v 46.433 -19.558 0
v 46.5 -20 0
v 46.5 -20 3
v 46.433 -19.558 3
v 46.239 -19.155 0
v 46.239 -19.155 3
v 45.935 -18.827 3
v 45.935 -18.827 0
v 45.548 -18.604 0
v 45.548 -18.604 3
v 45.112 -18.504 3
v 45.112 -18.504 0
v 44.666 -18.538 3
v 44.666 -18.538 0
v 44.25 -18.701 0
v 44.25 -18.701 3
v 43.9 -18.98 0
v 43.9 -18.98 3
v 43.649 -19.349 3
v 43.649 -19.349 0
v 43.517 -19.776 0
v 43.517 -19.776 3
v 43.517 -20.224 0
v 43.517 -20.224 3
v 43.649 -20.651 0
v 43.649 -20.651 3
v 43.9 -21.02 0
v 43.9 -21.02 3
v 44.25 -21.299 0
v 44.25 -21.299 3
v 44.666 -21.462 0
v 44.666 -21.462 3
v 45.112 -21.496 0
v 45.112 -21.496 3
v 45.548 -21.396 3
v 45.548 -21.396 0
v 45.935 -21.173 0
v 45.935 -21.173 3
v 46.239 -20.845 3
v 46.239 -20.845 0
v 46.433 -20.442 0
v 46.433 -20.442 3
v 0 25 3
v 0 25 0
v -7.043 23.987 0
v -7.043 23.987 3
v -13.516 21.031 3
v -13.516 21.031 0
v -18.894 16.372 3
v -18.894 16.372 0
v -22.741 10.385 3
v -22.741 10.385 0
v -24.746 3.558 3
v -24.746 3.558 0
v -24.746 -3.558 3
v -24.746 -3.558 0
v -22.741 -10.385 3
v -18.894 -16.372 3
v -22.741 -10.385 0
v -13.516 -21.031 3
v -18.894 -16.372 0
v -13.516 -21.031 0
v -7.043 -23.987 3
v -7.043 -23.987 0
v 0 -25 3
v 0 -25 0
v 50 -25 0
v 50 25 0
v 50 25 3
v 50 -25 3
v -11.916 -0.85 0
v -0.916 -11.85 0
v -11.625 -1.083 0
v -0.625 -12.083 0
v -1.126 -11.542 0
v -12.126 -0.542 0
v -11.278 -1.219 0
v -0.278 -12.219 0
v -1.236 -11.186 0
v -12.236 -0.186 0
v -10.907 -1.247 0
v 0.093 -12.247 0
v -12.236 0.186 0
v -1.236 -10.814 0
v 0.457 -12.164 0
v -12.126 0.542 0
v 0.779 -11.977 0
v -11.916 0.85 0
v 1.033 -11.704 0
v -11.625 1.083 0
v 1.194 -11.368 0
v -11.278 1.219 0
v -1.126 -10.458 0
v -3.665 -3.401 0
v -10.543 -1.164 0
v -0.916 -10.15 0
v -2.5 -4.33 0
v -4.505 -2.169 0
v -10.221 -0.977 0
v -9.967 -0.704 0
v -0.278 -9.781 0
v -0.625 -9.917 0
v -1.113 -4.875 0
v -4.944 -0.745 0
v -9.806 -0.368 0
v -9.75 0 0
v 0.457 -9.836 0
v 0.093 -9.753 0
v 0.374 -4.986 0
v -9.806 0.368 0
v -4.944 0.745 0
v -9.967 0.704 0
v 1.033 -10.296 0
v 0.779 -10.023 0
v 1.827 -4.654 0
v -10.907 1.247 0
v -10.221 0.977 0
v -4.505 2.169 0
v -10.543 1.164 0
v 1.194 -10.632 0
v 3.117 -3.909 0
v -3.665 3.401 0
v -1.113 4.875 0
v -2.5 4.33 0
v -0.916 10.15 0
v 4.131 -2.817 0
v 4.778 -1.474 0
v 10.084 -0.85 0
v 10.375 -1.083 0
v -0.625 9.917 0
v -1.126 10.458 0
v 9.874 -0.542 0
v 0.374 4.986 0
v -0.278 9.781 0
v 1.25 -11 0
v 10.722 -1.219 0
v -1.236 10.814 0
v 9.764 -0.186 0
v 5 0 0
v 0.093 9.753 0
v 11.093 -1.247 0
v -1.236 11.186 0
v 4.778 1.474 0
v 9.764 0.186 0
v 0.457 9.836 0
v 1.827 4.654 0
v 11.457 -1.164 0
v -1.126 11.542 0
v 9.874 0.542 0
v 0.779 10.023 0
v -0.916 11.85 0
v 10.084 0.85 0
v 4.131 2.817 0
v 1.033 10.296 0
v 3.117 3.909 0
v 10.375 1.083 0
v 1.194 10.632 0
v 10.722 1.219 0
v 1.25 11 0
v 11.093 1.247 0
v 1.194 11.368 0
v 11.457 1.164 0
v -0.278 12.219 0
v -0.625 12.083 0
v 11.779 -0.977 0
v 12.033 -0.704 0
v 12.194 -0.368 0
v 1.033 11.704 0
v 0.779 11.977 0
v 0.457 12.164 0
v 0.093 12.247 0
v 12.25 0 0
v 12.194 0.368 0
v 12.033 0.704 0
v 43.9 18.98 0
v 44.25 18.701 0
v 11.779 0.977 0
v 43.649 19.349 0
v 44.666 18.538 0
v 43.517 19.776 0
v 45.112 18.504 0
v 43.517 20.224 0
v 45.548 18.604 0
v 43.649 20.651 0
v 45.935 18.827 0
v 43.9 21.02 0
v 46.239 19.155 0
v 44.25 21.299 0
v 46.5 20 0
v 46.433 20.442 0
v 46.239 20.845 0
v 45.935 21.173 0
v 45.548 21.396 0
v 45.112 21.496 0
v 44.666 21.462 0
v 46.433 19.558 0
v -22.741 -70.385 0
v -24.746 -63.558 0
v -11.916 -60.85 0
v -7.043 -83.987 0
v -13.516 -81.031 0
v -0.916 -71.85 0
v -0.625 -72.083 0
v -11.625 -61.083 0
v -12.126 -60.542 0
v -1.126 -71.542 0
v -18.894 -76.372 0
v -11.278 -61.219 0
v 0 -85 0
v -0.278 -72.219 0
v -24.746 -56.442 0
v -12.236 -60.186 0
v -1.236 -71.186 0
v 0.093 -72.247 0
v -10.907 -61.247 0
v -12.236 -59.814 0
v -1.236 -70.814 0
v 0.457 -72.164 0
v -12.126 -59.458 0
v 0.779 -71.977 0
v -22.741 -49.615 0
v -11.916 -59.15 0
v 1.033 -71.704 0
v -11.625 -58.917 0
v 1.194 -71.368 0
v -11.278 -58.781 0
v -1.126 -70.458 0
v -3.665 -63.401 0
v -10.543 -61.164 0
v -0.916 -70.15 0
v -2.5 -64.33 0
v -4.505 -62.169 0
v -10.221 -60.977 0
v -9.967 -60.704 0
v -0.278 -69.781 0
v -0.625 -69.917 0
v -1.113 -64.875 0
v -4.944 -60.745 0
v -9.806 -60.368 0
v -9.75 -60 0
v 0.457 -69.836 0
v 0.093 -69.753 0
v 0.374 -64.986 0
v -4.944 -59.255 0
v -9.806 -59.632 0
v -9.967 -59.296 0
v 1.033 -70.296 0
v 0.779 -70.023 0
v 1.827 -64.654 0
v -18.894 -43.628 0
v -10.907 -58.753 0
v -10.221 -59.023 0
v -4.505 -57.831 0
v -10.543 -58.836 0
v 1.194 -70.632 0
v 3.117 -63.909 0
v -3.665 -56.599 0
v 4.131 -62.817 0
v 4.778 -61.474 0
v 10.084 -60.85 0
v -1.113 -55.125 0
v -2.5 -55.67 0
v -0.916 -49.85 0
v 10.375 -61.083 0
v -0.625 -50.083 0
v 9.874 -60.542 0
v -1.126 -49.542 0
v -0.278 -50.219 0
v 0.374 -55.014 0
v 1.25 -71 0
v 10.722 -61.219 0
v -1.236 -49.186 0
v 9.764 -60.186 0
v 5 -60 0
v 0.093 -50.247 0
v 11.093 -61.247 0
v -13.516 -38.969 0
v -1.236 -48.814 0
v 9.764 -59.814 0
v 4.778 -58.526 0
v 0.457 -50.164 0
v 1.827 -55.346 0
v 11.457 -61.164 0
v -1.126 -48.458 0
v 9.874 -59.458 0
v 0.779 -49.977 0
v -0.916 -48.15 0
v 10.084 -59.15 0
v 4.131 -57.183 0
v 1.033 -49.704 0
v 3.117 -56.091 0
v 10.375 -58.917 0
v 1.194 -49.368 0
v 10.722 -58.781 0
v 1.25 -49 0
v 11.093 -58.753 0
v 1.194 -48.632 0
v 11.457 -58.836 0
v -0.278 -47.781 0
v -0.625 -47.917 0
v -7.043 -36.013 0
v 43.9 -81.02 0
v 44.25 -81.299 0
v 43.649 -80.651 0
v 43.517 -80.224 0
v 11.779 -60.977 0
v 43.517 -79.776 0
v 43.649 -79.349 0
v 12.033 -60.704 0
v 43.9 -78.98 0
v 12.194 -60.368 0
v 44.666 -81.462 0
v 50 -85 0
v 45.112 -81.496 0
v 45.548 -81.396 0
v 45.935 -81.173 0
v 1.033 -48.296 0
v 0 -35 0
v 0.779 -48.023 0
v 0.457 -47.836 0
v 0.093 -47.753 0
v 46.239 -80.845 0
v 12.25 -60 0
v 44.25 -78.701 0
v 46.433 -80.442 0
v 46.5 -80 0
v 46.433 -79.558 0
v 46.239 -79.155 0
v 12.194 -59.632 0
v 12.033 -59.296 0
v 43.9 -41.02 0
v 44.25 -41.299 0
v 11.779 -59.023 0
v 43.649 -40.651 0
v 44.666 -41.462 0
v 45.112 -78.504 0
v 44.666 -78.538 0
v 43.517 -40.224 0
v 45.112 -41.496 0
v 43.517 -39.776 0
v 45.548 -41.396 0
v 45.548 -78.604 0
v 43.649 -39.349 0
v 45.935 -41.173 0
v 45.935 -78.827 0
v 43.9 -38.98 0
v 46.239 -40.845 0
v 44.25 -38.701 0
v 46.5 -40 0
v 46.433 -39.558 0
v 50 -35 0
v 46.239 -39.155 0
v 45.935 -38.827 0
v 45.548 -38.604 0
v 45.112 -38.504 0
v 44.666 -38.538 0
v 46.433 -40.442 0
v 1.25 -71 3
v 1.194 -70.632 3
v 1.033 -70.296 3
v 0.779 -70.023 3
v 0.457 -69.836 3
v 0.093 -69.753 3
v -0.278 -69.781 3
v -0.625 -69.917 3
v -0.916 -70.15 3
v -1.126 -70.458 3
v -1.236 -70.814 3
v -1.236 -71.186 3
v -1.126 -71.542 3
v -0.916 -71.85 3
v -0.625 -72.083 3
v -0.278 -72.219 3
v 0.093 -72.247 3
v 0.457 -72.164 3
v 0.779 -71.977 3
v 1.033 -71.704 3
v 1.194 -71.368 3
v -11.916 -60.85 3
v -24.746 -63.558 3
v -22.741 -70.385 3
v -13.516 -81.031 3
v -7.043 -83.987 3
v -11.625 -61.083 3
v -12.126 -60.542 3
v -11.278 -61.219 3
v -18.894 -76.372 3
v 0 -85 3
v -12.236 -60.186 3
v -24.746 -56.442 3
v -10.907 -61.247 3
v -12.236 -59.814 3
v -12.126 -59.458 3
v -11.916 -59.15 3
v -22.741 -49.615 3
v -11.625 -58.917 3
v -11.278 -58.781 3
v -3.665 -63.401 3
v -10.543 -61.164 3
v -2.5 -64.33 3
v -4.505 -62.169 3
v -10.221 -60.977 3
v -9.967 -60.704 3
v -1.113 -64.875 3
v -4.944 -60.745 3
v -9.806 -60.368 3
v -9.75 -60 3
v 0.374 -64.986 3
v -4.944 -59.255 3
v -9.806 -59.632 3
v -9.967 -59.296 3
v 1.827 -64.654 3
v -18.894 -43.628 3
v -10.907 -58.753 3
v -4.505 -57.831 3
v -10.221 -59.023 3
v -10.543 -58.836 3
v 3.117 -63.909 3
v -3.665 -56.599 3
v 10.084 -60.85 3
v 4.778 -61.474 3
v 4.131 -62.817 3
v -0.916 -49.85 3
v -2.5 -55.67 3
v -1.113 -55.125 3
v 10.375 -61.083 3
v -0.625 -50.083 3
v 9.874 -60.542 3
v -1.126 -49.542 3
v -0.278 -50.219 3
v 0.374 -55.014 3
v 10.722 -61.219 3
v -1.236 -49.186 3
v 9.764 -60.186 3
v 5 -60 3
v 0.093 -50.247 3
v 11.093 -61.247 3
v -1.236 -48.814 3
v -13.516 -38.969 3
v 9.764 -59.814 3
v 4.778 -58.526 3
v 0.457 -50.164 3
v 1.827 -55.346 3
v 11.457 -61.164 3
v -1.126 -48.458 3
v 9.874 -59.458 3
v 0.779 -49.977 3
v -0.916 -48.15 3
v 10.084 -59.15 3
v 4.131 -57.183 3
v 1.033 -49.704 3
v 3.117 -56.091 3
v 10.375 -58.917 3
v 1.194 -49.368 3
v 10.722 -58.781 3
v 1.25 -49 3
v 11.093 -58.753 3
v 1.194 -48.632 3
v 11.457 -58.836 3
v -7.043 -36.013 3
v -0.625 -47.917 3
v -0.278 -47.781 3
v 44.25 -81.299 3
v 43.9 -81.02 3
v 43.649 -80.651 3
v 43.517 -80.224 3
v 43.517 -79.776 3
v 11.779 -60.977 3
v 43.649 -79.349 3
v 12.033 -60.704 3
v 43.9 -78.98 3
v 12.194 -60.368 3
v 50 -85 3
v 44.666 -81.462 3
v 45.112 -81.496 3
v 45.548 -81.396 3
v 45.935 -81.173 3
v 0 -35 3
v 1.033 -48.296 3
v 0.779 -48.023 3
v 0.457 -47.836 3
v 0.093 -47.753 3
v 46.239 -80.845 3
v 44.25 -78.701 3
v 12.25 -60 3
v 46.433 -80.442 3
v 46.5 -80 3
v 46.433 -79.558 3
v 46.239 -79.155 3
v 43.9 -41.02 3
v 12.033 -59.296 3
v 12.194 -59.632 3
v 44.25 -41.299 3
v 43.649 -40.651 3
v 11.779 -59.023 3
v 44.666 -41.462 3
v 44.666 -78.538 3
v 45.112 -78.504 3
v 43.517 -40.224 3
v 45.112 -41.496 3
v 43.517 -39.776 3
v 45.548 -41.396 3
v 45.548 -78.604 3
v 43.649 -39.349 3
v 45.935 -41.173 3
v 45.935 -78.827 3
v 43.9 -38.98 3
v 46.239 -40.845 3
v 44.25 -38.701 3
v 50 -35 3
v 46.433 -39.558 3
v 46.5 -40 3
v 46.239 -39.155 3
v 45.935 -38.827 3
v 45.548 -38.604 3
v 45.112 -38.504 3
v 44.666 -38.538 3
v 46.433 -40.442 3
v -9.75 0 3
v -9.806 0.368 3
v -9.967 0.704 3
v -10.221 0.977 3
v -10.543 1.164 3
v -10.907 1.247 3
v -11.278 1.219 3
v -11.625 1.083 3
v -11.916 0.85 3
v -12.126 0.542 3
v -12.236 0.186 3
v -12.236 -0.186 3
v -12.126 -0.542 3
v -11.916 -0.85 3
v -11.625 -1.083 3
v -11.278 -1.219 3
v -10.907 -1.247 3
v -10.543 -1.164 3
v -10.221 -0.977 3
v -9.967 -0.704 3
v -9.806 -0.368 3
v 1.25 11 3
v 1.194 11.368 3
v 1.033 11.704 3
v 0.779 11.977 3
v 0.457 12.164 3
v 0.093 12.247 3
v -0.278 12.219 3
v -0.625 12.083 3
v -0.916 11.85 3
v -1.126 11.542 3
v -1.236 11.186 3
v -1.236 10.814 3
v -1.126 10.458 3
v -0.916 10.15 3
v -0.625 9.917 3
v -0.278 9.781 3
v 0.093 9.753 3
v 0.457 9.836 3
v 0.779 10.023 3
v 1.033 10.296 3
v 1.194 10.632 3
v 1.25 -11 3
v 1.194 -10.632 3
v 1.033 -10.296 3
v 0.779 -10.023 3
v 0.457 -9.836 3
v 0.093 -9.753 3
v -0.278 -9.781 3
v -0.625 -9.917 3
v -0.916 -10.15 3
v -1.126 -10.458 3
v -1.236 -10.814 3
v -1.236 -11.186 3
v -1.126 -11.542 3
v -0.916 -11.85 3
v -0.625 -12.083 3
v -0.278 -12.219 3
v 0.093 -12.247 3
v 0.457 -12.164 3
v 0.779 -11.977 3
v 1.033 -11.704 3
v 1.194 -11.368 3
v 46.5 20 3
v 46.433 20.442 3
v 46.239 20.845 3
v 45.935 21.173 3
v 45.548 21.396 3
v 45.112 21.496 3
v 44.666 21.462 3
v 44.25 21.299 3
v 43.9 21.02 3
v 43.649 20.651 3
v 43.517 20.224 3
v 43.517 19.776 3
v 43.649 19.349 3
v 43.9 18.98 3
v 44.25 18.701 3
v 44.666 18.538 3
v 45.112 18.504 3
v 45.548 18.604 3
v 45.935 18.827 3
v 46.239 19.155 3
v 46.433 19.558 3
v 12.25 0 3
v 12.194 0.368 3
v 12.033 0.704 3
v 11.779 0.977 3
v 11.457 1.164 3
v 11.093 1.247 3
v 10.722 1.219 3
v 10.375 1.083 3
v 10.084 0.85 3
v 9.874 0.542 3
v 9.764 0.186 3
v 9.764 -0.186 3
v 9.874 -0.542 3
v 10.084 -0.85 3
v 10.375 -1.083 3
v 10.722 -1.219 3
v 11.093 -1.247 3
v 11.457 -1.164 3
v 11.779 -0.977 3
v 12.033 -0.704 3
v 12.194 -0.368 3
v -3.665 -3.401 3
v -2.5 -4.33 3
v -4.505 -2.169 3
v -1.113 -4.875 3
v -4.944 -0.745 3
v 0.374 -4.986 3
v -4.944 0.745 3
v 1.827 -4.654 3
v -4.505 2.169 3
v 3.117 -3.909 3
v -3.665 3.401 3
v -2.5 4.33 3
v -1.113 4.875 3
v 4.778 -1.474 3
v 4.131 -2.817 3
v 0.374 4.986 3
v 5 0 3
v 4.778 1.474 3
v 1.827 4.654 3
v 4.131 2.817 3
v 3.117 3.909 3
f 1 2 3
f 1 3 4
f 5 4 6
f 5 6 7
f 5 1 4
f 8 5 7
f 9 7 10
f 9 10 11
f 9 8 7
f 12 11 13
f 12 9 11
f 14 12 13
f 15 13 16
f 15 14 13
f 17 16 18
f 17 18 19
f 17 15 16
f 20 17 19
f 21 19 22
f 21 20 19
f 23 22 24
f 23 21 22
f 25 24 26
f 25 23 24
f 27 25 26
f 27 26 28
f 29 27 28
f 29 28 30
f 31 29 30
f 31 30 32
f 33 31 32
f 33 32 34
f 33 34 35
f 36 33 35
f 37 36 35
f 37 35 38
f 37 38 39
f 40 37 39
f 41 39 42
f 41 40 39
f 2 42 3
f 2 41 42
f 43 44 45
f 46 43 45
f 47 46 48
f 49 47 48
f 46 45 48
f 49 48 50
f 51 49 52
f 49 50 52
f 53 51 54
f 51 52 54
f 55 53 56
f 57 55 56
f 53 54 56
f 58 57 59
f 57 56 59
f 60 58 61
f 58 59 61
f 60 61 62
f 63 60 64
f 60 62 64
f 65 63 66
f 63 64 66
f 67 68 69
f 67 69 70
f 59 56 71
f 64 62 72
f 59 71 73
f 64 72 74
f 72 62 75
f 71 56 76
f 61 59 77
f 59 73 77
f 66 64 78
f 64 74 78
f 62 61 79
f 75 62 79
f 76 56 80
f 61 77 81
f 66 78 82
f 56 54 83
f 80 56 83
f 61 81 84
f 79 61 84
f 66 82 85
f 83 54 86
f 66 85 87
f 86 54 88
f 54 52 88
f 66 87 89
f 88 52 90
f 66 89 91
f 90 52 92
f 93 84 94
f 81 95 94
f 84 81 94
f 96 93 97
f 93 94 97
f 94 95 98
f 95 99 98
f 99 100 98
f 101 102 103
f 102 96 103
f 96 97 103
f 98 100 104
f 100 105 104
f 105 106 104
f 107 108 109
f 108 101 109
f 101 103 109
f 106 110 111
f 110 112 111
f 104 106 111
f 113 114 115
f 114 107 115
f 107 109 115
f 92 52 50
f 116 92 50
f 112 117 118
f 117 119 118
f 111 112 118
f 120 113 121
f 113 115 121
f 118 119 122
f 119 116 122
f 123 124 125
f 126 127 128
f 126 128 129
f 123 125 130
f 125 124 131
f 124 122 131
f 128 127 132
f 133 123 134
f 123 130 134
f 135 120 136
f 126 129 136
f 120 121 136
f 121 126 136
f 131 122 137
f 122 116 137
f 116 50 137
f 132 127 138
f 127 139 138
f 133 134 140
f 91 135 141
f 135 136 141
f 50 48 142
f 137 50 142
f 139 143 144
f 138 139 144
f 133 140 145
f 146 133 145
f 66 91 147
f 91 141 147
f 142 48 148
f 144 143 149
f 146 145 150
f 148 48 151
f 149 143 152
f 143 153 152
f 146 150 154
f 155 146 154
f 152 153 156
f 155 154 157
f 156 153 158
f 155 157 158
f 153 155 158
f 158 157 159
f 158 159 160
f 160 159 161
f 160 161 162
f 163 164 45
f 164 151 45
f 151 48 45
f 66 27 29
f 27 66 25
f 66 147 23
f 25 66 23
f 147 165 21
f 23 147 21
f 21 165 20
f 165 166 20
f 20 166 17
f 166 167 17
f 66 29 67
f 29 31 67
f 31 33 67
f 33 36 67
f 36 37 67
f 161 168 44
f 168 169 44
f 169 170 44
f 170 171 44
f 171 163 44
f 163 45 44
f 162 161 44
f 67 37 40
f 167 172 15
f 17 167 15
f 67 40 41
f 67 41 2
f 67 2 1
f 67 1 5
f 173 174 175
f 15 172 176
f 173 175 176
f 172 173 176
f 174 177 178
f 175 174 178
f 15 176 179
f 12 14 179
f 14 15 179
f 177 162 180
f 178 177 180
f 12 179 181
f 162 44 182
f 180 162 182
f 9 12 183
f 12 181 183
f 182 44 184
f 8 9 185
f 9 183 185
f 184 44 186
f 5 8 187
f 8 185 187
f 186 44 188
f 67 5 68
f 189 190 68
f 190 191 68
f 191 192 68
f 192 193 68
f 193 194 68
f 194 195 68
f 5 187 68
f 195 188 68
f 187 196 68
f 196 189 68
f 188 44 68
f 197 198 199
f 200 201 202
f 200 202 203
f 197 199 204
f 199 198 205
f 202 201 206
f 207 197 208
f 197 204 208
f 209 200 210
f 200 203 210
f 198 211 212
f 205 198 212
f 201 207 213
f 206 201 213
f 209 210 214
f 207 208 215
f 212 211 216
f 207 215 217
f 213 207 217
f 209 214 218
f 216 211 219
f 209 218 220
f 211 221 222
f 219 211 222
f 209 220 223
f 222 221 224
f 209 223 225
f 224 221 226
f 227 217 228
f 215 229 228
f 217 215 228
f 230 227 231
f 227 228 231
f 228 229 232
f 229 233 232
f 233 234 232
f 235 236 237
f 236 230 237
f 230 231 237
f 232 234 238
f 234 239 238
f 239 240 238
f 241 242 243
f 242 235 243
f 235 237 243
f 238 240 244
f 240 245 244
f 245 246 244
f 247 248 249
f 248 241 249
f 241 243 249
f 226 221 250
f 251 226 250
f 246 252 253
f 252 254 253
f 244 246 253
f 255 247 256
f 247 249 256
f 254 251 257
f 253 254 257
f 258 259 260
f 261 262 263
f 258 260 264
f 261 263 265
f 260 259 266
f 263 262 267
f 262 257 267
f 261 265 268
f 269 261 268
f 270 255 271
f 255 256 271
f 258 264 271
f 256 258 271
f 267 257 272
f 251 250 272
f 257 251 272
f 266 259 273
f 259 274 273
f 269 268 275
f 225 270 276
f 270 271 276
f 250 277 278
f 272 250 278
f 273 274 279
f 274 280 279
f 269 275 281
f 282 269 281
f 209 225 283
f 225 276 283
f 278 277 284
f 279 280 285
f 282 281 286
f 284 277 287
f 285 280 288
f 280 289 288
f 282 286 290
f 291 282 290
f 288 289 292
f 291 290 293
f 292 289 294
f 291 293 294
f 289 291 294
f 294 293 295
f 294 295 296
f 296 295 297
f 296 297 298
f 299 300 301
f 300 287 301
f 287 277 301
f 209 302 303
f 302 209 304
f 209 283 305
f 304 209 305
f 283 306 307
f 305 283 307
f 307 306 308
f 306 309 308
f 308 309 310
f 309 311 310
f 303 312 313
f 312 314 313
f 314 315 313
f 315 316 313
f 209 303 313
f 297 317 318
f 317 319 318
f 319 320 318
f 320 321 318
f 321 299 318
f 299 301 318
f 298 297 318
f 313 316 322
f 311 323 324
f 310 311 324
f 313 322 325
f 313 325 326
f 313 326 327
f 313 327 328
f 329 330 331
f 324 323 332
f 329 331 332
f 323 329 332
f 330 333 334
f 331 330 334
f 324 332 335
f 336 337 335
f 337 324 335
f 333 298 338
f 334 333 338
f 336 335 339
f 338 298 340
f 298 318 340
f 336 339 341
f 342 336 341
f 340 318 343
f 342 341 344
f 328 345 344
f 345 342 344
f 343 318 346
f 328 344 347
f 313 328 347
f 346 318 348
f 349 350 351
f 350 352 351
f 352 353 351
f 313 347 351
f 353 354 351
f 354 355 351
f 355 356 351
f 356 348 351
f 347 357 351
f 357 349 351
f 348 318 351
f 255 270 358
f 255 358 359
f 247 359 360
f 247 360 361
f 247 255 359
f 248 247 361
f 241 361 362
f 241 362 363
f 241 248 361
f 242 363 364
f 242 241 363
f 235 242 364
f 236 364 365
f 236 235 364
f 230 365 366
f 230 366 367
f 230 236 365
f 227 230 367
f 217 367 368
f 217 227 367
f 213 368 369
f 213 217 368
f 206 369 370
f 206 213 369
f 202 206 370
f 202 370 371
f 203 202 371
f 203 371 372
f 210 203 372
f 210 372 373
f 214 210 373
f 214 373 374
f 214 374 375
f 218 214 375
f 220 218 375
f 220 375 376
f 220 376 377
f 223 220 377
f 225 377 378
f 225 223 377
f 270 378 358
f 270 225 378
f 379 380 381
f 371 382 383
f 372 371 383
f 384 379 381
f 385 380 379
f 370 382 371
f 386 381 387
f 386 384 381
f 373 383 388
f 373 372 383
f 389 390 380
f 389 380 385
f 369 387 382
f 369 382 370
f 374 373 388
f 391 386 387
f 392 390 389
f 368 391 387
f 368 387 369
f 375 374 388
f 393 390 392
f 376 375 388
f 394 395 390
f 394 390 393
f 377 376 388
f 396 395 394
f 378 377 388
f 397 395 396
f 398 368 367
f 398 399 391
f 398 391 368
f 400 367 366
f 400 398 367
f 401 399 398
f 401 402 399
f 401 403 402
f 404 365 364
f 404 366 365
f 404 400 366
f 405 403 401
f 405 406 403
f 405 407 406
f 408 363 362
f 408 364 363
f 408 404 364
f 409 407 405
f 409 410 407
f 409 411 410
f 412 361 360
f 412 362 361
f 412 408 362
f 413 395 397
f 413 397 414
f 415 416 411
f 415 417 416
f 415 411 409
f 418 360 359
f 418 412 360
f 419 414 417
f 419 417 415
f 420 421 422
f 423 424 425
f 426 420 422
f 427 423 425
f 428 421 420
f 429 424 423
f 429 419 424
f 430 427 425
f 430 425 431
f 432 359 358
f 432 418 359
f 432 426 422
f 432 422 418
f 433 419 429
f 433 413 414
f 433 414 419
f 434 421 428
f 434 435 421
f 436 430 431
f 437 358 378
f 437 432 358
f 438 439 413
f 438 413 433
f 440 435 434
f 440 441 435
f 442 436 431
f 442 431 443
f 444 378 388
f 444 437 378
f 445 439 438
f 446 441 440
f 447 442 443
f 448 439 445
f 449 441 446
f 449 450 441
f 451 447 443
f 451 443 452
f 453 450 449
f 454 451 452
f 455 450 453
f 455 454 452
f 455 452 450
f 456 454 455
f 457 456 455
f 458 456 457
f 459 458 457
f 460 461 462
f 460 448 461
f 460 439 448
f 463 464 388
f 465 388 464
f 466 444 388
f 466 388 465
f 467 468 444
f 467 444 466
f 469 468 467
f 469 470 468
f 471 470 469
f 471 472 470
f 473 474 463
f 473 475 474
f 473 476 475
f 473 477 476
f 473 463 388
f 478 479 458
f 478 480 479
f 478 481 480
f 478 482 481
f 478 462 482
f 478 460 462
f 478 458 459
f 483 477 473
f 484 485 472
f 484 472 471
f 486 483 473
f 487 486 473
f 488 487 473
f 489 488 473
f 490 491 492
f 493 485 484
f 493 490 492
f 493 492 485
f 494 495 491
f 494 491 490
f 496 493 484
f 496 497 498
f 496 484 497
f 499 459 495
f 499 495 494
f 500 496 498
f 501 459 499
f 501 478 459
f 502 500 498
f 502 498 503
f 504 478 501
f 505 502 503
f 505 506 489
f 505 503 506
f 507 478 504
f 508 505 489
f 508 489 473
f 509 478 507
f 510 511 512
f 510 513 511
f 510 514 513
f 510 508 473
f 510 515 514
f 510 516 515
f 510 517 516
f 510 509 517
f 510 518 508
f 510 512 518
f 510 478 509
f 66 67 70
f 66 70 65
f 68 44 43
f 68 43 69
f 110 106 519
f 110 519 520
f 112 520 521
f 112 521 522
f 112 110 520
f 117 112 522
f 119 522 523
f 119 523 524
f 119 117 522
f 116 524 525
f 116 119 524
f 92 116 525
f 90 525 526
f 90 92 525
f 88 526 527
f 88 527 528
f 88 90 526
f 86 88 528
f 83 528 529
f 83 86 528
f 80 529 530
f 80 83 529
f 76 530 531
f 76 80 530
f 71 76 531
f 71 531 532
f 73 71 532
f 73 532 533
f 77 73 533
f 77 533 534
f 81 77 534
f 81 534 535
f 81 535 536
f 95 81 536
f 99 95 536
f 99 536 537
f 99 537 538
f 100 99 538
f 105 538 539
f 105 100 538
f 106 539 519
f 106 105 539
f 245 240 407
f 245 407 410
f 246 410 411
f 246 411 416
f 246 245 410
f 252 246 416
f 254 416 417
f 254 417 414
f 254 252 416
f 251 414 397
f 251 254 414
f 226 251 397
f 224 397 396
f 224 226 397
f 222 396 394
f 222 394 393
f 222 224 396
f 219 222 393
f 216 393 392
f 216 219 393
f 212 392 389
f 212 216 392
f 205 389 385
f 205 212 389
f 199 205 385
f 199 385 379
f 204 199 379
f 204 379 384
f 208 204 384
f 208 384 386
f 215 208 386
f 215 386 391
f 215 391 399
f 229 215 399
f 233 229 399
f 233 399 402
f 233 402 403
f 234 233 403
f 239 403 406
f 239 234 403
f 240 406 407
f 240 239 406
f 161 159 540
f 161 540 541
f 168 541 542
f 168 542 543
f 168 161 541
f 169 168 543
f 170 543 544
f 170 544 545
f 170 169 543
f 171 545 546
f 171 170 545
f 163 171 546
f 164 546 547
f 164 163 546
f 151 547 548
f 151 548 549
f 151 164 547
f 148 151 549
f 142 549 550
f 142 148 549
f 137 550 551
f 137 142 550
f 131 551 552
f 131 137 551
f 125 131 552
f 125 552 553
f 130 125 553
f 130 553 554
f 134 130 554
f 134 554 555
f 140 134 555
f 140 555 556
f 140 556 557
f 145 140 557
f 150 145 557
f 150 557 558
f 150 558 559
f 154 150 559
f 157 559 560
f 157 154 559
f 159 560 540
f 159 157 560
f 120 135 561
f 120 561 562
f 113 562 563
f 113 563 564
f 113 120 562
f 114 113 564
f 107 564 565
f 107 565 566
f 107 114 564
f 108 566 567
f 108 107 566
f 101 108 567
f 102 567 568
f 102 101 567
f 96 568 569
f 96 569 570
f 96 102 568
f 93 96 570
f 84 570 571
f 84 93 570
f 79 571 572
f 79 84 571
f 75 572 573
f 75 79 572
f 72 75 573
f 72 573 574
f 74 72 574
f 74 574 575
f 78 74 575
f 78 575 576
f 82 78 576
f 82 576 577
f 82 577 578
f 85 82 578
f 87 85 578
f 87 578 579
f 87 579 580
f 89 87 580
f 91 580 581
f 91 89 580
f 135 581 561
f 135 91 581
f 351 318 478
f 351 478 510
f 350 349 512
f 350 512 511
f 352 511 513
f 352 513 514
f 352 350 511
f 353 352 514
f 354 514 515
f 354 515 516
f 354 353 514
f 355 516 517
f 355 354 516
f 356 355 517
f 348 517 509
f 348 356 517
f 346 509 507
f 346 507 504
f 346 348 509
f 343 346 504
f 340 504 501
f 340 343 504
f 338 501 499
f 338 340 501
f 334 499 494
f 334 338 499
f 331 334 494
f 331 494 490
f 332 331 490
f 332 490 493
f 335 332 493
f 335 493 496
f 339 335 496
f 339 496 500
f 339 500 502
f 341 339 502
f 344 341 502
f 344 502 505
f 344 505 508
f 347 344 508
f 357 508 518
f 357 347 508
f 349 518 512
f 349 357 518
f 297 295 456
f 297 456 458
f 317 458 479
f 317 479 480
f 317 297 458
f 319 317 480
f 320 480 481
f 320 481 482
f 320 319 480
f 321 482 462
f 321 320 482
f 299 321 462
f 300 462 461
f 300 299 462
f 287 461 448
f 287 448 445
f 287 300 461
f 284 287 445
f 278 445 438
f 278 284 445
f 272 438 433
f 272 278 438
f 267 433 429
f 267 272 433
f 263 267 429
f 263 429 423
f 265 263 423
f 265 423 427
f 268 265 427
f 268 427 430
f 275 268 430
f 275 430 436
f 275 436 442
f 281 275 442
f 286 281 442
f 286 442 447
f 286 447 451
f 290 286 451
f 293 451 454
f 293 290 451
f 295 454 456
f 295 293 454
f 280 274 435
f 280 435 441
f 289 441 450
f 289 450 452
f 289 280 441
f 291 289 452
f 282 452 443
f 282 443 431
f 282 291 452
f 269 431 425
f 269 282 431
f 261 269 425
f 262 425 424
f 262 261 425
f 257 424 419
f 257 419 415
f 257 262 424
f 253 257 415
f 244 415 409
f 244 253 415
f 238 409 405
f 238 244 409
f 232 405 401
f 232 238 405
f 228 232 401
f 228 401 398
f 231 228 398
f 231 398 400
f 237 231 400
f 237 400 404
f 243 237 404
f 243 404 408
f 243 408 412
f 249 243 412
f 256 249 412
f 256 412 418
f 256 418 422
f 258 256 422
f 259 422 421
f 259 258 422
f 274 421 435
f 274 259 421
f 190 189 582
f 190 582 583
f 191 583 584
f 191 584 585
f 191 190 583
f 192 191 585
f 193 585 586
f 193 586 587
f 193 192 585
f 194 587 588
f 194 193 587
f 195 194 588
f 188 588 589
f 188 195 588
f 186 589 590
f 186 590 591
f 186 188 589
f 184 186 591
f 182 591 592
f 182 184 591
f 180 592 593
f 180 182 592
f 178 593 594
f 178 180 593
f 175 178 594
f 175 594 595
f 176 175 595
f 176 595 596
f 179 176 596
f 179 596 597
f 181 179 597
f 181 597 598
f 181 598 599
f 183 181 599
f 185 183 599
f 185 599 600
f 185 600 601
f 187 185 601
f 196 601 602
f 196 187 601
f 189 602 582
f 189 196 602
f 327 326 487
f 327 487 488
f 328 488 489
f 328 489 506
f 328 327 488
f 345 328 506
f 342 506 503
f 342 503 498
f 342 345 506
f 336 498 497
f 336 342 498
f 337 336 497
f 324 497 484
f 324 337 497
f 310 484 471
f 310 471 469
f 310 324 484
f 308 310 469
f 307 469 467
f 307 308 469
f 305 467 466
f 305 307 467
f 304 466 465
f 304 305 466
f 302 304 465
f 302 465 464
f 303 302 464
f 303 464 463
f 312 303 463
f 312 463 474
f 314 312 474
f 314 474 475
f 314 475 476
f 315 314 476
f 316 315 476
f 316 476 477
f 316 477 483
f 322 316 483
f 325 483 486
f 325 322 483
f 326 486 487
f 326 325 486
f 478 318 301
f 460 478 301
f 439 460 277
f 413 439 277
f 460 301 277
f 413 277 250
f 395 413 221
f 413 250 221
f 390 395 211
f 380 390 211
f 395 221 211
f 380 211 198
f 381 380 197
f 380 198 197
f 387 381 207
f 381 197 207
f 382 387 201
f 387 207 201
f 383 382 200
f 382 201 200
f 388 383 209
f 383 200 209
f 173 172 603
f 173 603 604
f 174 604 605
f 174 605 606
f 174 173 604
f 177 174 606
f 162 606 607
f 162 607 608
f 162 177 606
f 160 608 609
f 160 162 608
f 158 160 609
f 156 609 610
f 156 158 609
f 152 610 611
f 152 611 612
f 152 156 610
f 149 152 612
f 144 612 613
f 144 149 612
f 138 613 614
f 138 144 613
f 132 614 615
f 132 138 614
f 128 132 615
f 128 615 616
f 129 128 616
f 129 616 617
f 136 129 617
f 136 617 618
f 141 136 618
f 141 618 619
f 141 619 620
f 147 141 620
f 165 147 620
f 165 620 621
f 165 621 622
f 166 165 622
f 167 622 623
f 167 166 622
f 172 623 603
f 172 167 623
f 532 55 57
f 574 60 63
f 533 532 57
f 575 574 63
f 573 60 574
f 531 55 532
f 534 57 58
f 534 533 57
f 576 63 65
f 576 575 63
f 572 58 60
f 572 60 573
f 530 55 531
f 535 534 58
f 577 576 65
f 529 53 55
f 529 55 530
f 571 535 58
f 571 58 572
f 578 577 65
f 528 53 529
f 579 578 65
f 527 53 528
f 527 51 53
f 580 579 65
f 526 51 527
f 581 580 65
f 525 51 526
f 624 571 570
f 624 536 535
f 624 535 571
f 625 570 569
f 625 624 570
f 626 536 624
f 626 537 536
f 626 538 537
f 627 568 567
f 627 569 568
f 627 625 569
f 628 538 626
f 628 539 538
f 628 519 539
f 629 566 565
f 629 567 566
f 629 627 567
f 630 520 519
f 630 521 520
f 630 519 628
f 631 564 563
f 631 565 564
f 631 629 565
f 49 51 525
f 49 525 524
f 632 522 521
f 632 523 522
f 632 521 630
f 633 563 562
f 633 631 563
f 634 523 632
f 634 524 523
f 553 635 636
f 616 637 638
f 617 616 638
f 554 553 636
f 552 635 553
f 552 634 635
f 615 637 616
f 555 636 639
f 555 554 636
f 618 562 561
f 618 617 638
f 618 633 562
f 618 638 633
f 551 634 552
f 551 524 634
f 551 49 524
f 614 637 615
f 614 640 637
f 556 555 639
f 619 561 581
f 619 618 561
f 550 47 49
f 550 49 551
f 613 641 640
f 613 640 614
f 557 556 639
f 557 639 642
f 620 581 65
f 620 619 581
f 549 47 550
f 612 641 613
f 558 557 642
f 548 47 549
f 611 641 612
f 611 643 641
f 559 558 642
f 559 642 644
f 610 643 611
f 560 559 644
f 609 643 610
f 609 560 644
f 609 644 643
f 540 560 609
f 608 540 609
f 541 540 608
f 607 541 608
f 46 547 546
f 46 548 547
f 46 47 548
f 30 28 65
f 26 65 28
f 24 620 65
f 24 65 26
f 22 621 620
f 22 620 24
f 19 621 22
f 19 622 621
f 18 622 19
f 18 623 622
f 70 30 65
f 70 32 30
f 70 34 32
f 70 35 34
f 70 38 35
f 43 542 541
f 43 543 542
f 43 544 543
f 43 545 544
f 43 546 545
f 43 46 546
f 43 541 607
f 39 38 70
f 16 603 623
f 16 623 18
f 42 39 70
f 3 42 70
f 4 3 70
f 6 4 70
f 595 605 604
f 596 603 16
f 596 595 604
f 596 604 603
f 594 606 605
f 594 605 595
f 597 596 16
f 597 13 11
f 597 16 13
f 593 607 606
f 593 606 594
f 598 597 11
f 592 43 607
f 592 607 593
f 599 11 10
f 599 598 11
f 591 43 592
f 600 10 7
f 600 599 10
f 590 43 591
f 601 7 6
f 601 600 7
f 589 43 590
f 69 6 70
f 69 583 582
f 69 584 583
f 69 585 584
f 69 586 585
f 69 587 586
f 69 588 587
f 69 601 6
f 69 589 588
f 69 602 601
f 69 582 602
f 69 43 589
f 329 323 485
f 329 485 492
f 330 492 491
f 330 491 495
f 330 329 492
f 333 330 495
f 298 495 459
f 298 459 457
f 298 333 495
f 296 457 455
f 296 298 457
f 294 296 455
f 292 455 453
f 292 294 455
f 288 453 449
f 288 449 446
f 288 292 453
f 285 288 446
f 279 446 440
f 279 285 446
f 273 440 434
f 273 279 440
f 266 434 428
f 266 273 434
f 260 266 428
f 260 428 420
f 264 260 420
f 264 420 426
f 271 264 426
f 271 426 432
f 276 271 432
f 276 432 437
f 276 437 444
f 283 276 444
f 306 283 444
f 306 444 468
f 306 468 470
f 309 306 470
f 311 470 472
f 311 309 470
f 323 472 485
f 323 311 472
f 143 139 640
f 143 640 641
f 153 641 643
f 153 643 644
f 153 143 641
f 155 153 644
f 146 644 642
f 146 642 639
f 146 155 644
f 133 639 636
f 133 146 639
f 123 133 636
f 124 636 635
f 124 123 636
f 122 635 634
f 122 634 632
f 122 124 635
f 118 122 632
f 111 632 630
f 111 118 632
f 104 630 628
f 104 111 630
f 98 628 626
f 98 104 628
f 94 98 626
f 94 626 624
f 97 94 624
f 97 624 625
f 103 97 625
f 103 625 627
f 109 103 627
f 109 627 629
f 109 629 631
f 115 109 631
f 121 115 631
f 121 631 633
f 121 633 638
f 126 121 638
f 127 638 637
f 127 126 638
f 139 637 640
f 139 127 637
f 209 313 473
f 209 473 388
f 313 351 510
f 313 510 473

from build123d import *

# Parameters (mm, degrees)
SKETCH_R   = 1.25
SKETCH_R_2 = 1.5
SKETCH_R_3 = 5
PAD_DEPTH  = 3


with BuildPart() as part:
    # Sketch → Pad (new body)
    with BuildSketch(Plane.XY):
        with BuildLine():
            ThreePointArc((0, 25), (-25, 0), (0, -25))
            Line((50, -25), (0, -25))
            Line((50, 25), (50, -25))
            Line((0, 25), (50, 25))
        make_face()
        with Locations((0, 11)):
            Circle(SKETCH_R, mode=Mode.SUBTRACT)
        with Locations((-11, 0)):
            Circle(SKETCH_R, mode=Mode.SUBTRACT)
        with Locations((0, -11)):
            Circle(SKETCH_R, mode=Mode.SUBTRACT)
        with Locations((11, 0)):
            Circle(SKETCH_R, mode=Mode.SUBTRACT)
        with Locations((45, 20)):
            Circle(SKETCH_R_2, mode=Mode.SUBTRACT)
        with Locations((45, -20)):
            Circle(SKETCH_R_2, mode=Mode.SUBTRACT)
        Circle(SKETCH_R_3, mode=Mode.SUBTRACT)
        with BuildLine():
            ThreePointArc((0, -35), (-25, -60.000034), (6.9e-05, -85))
            Line((50, -85), (6.9e-05, -85))
            Line((50, -35), (50, -85))
            Line((0, -35), (50, -35))
        make_face()
        with Locations((0, -49)):
            Circle(SKETCH_R, mode=Mode.SUBTRACT)
        with Locations((-11, -60)):
            Circle(SKETCH_R, mode=Mode.SUBTRACT)
        with Locations((0, -71)):
            Circle(SKETCH_R, mode=Mode.SUBTRACT)
        with Locations((11, -60)):
            Circle(SKETCH_R, mode=Mode.SUBTRACT)
        with Locations((45, -40)):
            Circle(SKETCH_R_2, mode=Mode.SUBTRACT)
        with Locations((45, -80)):
            Circle(SKETCH_R_2, mode=Mode.SUBTRACT)
        with Locations((0, -60)):
            Circle(SKETCH_R_3, mode=Mode.SUBTRACT)
    extrude(amount=PAD_DEPTH)


solid = part.part
